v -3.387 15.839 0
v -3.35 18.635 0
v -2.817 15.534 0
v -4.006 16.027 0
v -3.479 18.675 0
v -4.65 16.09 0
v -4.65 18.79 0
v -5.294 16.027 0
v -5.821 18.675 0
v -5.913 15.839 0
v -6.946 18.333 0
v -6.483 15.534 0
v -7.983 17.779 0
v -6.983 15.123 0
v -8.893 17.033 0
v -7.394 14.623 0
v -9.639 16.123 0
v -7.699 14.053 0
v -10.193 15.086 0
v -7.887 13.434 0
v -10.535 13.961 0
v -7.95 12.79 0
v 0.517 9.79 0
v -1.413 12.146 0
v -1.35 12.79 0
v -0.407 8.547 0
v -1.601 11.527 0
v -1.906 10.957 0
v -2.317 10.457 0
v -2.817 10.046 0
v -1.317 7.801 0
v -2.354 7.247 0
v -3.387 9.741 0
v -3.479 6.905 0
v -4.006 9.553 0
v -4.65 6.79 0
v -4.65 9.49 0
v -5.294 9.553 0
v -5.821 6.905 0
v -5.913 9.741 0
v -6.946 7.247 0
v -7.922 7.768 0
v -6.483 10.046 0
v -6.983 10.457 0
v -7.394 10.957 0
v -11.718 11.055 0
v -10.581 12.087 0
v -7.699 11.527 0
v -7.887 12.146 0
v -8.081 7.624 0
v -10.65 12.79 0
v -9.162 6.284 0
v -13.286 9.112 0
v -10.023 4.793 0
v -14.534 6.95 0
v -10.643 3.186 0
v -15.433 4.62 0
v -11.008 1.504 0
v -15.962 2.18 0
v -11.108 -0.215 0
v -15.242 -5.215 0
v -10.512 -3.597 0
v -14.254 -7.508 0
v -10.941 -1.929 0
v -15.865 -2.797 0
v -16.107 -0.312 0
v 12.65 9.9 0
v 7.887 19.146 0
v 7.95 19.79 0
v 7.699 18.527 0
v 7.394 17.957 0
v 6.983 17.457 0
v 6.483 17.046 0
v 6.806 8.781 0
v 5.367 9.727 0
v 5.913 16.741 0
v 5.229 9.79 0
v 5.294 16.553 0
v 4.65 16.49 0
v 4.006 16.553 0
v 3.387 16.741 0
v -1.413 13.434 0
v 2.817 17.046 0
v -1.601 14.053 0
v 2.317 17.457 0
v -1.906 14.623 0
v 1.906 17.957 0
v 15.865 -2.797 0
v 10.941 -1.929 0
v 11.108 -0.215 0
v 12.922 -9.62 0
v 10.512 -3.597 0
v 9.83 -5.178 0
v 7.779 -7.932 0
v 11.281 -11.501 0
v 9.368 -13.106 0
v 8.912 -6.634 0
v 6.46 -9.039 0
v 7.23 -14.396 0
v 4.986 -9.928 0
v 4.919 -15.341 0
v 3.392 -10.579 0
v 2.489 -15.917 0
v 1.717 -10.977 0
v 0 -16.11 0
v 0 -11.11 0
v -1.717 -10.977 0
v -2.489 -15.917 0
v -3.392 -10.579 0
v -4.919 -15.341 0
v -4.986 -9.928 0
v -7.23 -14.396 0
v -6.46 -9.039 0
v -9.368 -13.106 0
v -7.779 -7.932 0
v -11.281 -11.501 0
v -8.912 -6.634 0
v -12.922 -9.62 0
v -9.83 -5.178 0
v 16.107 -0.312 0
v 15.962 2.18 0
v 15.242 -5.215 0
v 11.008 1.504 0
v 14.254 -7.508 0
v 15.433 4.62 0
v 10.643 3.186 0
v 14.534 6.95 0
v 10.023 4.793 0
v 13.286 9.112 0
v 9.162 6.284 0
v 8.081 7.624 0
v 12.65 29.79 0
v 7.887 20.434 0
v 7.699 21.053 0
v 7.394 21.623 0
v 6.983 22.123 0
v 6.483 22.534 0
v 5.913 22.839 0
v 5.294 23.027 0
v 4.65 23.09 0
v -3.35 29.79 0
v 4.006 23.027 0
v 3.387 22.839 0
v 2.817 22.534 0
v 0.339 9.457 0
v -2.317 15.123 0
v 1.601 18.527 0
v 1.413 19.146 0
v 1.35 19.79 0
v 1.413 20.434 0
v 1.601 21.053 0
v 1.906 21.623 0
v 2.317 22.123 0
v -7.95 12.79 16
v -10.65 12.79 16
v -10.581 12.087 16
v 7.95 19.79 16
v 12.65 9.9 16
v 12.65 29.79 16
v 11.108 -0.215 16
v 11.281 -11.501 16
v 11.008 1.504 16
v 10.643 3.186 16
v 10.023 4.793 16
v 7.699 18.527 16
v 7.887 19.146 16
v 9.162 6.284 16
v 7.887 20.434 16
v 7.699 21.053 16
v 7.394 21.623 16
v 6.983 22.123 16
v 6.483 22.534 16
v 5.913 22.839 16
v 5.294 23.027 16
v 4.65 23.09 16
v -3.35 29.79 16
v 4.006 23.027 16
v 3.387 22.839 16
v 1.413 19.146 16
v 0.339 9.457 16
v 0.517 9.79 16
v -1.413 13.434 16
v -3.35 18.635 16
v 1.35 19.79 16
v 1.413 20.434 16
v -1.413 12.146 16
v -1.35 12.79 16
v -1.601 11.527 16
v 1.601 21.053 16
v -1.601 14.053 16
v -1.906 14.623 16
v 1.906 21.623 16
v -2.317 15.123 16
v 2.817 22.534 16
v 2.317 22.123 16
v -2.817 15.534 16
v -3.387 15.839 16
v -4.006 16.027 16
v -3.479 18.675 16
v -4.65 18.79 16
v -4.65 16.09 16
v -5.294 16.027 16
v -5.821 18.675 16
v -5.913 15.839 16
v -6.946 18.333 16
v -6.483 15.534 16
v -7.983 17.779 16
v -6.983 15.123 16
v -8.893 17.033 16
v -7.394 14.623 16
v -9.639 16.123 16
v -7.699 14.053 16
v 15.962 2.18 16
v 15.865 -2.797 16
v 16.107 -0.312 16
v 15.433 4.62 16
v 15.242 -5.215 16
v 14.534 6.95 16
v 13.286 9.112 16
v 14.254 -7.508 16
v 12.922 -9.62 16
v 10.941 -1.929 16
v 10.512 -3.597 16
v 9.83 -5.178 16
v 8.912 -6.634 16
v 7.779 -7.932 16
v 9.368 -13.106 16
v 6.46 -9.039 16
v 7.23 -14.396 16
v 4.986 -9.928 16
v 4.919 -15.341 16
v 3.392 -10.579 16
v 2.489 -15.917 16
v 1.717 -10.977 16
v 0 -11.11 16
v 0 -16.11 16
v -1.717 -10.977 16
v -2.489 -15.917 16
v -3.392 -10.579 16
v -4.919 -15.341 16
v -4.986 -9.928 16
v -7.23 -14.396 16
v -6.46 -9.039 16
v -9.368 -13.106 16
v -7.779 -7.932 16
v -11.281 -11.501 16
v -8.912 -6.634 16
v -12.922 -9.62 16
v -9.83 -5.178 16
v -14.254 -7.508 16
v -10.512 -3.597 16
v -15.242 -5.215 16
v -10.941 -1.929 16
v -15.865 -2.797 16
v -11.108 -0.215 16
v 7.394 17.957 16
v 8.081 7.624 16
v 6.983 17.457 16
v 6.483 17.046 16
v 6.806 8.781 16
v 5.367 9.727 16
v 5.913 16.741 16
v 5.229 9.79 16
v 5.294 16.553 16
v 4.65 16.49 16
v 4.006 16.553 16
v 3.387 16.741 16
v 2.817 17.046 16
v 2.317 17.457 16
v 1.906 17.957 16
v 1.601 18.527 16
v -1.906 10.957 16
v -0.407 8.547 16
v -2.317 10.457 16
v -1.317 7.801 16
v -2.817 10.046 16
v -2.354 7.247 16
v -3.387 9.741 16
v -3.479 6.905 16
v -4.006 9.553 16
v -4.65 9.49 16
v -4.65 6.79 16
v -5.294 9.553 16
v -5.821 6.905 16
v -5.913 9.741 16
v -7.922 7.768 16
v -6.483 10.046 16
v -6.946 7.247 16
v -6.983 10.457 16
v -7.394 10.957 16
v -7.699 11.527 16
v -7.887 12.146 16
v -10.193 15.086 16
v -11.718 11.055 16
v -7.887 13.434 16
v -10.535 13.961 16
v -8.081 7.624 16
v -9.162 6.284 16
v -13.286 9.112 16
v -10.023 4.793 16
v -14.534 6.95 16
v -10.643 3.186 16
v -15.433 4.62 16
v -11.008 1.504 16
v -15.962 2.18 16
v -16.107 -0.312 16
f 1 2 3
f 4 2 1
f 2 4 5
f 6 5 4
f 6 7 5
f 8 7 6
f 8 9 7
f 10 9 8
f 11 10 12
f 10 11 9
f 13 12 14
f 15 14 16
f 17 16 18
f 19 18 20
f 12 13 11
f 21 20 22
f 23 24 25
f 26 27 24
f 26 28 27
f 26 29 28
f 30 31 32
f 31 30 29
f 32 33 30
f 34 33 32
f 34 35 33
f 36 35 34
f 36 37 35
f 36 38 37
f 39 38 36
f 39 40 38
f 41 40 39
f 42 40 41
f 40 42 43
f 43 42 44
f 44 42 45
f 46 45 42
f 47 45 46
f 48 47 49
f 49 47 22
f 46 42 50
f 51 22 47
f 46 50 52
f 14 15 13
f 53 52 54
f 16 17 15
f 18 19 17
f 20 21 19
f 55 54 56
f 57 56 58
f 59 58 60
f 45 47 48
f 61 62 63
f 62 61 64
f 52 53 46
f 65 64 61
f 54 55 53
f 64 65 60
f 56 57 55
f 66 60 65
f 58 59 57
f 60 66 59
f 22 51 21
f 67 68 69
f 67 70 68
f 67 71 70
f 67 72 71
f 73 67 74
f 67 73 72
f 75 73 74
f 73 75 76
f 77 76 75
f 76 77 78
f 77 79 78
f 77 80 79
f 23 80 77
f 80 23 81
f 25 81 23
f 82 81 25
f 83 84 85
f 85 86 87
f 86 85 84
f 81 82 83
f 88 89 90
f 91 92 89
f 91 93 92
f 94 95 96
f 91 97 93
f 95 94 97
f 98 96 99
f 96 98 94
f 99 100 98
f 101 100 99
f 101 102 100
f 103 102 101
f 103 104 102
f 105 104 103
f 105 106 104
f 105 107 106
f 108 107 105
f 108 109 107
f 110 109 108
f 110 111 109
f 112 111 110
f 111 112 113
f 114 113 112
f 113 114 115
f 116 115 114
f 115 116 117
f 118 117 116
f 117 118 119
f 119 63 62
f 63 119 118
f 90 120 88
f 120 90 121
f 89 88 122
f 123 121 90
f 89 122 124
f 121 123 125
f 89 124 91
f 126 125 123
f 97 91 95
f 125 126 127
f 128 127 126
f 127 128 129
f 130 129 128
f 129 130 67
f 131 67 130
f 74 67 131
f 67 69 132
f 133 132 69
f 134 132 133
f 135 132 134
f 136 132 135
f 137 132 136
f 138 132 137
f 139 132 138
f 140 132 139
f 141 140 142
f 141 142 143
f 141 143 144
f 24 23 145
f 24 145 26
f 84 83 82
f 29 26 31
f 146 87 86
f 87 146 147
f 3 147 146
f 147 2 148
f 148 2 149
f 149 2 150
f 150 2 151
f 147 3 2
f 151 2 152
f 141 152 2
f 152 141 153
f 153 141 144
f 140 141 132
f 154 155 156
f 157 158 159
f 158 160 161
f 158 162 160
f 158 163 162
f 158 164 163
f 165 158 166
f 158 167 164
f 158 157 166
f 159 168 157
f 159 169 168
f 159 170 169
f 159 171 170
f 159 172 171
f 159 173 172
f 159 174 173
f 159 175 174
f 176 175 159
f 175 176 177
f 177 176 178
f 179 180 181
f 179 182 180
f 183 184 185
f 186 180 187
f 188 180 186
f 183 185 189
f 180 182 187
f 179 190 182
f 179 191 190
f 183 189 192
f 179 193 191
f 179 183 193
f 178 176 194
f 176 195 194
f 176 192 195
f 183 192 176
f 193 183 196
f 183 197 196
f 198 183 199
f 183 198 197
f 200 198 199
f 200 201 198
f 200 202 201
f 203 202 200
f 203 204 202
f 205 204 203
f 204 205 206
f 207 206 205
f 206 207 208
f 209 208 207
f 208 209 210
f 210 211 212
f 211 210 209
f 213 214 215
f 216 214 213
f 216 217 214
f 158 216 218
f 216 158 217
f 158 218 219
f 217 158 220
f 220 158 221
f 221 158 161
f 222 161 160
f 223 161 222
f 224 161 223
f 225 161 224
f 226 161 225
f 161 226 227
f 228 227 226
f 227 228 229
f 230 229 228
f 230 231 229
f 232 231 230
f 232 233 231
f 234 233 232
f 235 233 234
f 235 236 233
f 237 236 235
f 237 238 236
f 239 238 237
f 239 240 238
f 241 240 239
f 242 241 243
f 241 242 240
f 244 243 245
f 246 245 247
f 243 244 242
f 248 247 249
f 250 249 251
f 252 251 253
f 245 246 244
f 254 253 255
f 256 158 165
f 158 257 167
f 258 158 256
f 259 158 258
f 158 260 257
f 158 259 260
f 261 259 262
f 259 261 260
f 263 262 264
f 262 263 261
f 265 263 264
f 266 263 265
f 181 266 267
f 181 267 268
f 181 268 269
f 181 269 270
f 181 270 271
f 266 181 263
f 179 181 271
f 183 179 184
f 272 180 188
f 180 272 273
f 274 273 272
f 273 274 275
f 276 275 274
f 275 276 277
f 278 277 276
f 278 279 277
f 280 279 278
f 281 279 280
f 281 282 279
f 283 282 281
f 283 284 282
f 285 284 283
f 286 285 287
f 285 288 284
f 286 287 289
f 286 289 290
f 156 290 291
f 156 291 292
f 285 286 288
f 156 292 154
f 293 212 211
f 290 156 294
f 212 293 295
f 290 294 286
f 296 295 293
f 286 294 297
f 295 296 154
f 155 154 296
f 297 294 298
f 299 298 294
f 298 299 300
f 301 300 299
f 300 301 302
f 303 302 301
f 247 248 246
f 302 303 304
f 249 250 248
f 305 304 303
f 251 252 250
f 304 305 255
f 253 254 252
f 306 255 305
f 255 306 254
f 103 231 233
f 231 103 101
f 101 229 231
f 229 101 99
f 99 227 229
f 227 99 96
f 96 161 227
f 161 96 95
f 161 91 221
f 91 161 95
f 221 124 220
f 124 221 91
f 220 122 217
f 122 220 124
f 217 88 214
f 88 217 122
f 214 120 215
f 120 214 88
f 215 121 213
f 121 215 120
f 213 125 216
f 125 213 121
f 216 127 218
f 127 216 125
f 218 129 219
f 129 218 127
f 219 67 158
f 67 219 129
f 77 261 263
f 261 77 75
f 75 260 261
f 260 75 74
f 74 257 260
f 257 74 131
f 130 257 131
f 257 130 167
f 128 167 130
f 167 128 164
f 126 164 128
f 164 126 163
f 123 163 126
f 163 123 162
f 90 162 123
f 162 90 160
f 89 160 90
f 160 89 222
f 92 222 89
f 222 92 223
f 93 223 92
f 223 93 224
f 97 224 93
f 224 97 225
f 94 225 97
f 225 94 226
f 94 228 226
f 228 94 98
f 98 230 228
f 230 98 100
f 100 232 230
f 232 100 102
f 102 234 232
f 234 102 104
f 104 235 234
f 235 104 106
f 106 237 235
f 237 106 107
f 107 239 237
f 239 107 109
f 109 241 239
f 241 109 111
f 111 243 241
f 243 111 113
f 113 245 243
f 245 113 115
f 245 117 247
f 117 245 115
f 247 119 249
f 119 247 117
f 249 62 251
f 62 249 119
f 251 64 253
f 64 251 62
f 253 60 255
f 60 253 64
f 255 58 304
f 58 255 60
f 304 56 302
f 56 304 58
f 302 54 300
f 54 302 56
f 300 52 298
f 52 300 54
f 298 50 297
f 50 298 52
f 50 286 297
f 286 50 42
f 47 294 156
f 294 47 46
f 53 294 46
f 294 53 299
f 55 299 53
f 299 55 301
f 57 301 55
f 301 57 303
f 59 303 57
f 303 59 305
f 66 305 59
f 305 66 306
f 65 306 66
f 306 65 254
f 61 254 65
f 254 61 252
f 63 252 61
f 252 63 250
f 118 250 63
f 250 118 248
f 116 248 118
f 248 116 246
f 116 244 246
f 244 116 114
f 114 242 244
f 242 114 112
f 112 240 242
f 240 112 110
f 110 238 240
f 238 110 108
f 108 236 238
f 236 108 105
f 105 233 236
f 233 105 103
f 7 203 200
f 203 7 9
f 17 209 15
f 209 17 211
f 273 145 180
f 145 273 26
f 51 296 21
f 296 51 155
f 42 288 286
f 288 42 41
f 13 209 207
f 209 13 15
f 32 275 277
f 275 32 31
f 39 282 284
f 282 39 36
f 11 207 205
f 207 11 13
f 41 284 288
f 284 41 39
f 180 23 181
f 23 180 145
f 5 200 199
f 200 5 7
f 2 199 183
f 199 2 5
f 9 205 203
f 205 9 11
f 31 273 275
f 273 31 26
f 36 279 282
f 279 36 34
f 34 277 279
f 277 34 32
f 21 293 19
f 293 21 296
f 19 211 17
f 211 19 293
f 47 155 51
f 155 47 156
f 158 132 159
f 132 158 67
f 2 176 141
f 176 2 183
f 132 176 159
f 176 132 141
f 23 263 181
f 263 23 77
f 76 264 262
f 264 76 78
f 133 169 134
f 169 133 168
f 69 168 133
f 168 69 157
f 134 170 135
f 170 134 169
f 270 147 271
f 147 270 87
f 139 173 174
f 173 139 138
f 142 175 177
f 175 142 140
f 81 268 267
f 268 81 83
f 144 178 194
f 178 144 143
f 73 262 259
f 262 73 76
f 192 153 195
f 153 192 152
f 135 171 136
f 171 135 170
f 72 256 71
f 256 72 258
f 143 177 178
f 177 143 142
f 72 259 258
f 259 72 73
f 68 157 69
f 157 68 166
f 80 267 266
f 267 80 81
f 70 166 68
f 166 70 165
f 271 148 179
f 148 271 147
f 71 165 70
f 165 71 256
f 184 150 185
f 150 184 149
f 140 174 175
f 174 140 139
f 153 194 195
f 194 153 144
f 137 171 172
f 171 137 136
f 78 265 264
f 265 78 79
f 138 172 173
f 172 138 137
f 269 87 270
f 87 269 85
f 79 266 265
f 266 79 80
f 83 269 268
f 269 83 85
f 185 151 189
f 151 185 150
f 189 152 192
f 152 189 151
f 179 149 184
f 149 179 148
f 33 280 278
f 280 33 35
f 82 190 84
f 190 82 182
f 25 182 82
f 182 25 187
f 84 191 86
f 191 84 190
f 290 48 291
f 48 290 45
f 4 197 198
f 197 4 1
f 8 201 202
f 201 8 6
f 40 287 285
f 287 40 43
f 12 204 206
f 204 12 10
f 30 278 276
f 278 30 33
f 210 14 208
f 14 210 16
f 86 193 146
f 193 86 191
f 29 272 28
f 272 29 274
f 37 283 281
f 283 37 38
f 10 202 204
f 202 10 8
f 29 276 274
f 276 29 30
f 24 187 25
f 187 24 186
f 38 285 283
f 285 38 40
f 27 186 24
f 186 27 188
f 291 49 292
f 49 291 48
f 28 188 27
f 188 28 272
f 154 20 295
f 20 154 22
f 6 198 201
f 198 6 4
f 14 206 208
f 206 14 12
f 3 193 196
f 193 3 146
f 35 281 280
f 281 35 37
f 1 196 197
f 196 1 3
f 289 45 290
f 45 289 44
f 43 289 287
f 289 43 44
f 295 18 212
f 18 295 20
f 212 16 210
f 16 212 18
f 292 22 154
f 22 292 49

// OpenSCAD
$fn = 32;

// ----------------------------------------------------------------------
// Pipe clamp: 32.22 mm ring, 5 mm wall, 16 mm wide
// ----------------------------------------------------------------------

// --- parameters (mm) ---
outer_r = 16.11;          // clamp outside radius
inner_r = 11.11;          // pipe bore radius
band = 5;                 // band thickness
clamp_w = 16;             // clamp width
opening = 40;             // opening angle between the ends
lug_w = 16;               // lug width
lug_len = 20;             // lug length
bolt_d = 6.6;             // bolt hole
knuckle_d = 12;           // hinge knuckle diameter
pin_d = 6.6;              // hinge pin hole

clamp_profile = [[-5.51, 15.138], [-7.783, 14.105], [-9.869, 12.733], [-11.718, 11.055], [-13.286, 9.112], [-14.534, 6.95], [-15.433, 4.62], [-15.962, 2.18], [-16.107, -0.312], [-15.865, -2.797], [-15.242, -5.215], [-14.254, -7.508], [-12.922, -9.62], [-11.281, -11.501], [-9.368, -13.106], [-7.23, -14.396], [-4.919, -15.341], [-2.489, -15.917], [0, -16.11], [2.489, -15.917], [4.919, -15.341], [7.23, -14.396], [9.368, -13.106], [11.281, -11.501], [12.922, -9.62], [14.254, -7.508], [15.242, -5.215], [15.865, -2.797], [16.107, -0.312], [15.962, 2.18], [15.433, 4.62], [14.534, 6.95], [13.286, 9.112], [11.718, 11.055], [9.869, 12.733], [7.783, 14.105], [5.51, 15.138], [3.8, 10.44], [5.367, 9.727], [6.806, 8.781], [8.081, 7.624], [9.162, 6.284], [10.023, 4.793], [10.643, 3.186], [11.008, 1.504], [11.108, -0.215], [10.941, -1.929], [10.512, -3.597], [9.83, -5.178], [8.912, -6.634], [7.779, -7.932], [6.46, -9.039], [4.986, -9.928], [3.392, -10.579], [1.717, -10.977], [0, -11.11], [-1.717, -10.977], [-3.392, -10.579], [-4.986, -9.928], [-6.46, -9.039], [-7.779, -7.932], [-8.912, -6.634], [-9.83, -5.178], [-10.512, -3.597], [-10.941, -1.929], [-11.108, -0.215], [-11.008, 1.504], [-10.643, 3.186], [-10.023, 4.793], [-9.162, 6.284], [-8.081, 7.624], [-6.806, 8.781], [-5.367, 9.727], [-3.8, 10.44]];

difference() {
  union() {
    linear_extrude(height = clamp_w) polygon(clamp_profile);
    /* hinge knuckle, sunk 2 mm into the band end */
    translate([-4.65, 12.79, 0]) cylinder(h = clamp_w, d = knuckle_d);
    /* bolt lug on the other end */
    translate([-3.35, 9.79, 0]) cube([lug_w, 20, clamp_w]);
  }
  translate([4.65, 19.79, -2.5]) cylinder(h = clamp_w + 5, d = bolt_d);
  translate([-4.65, 12.79, -2.5]) cylinder(h = clamp_w + 5, d = pin_d);
}
